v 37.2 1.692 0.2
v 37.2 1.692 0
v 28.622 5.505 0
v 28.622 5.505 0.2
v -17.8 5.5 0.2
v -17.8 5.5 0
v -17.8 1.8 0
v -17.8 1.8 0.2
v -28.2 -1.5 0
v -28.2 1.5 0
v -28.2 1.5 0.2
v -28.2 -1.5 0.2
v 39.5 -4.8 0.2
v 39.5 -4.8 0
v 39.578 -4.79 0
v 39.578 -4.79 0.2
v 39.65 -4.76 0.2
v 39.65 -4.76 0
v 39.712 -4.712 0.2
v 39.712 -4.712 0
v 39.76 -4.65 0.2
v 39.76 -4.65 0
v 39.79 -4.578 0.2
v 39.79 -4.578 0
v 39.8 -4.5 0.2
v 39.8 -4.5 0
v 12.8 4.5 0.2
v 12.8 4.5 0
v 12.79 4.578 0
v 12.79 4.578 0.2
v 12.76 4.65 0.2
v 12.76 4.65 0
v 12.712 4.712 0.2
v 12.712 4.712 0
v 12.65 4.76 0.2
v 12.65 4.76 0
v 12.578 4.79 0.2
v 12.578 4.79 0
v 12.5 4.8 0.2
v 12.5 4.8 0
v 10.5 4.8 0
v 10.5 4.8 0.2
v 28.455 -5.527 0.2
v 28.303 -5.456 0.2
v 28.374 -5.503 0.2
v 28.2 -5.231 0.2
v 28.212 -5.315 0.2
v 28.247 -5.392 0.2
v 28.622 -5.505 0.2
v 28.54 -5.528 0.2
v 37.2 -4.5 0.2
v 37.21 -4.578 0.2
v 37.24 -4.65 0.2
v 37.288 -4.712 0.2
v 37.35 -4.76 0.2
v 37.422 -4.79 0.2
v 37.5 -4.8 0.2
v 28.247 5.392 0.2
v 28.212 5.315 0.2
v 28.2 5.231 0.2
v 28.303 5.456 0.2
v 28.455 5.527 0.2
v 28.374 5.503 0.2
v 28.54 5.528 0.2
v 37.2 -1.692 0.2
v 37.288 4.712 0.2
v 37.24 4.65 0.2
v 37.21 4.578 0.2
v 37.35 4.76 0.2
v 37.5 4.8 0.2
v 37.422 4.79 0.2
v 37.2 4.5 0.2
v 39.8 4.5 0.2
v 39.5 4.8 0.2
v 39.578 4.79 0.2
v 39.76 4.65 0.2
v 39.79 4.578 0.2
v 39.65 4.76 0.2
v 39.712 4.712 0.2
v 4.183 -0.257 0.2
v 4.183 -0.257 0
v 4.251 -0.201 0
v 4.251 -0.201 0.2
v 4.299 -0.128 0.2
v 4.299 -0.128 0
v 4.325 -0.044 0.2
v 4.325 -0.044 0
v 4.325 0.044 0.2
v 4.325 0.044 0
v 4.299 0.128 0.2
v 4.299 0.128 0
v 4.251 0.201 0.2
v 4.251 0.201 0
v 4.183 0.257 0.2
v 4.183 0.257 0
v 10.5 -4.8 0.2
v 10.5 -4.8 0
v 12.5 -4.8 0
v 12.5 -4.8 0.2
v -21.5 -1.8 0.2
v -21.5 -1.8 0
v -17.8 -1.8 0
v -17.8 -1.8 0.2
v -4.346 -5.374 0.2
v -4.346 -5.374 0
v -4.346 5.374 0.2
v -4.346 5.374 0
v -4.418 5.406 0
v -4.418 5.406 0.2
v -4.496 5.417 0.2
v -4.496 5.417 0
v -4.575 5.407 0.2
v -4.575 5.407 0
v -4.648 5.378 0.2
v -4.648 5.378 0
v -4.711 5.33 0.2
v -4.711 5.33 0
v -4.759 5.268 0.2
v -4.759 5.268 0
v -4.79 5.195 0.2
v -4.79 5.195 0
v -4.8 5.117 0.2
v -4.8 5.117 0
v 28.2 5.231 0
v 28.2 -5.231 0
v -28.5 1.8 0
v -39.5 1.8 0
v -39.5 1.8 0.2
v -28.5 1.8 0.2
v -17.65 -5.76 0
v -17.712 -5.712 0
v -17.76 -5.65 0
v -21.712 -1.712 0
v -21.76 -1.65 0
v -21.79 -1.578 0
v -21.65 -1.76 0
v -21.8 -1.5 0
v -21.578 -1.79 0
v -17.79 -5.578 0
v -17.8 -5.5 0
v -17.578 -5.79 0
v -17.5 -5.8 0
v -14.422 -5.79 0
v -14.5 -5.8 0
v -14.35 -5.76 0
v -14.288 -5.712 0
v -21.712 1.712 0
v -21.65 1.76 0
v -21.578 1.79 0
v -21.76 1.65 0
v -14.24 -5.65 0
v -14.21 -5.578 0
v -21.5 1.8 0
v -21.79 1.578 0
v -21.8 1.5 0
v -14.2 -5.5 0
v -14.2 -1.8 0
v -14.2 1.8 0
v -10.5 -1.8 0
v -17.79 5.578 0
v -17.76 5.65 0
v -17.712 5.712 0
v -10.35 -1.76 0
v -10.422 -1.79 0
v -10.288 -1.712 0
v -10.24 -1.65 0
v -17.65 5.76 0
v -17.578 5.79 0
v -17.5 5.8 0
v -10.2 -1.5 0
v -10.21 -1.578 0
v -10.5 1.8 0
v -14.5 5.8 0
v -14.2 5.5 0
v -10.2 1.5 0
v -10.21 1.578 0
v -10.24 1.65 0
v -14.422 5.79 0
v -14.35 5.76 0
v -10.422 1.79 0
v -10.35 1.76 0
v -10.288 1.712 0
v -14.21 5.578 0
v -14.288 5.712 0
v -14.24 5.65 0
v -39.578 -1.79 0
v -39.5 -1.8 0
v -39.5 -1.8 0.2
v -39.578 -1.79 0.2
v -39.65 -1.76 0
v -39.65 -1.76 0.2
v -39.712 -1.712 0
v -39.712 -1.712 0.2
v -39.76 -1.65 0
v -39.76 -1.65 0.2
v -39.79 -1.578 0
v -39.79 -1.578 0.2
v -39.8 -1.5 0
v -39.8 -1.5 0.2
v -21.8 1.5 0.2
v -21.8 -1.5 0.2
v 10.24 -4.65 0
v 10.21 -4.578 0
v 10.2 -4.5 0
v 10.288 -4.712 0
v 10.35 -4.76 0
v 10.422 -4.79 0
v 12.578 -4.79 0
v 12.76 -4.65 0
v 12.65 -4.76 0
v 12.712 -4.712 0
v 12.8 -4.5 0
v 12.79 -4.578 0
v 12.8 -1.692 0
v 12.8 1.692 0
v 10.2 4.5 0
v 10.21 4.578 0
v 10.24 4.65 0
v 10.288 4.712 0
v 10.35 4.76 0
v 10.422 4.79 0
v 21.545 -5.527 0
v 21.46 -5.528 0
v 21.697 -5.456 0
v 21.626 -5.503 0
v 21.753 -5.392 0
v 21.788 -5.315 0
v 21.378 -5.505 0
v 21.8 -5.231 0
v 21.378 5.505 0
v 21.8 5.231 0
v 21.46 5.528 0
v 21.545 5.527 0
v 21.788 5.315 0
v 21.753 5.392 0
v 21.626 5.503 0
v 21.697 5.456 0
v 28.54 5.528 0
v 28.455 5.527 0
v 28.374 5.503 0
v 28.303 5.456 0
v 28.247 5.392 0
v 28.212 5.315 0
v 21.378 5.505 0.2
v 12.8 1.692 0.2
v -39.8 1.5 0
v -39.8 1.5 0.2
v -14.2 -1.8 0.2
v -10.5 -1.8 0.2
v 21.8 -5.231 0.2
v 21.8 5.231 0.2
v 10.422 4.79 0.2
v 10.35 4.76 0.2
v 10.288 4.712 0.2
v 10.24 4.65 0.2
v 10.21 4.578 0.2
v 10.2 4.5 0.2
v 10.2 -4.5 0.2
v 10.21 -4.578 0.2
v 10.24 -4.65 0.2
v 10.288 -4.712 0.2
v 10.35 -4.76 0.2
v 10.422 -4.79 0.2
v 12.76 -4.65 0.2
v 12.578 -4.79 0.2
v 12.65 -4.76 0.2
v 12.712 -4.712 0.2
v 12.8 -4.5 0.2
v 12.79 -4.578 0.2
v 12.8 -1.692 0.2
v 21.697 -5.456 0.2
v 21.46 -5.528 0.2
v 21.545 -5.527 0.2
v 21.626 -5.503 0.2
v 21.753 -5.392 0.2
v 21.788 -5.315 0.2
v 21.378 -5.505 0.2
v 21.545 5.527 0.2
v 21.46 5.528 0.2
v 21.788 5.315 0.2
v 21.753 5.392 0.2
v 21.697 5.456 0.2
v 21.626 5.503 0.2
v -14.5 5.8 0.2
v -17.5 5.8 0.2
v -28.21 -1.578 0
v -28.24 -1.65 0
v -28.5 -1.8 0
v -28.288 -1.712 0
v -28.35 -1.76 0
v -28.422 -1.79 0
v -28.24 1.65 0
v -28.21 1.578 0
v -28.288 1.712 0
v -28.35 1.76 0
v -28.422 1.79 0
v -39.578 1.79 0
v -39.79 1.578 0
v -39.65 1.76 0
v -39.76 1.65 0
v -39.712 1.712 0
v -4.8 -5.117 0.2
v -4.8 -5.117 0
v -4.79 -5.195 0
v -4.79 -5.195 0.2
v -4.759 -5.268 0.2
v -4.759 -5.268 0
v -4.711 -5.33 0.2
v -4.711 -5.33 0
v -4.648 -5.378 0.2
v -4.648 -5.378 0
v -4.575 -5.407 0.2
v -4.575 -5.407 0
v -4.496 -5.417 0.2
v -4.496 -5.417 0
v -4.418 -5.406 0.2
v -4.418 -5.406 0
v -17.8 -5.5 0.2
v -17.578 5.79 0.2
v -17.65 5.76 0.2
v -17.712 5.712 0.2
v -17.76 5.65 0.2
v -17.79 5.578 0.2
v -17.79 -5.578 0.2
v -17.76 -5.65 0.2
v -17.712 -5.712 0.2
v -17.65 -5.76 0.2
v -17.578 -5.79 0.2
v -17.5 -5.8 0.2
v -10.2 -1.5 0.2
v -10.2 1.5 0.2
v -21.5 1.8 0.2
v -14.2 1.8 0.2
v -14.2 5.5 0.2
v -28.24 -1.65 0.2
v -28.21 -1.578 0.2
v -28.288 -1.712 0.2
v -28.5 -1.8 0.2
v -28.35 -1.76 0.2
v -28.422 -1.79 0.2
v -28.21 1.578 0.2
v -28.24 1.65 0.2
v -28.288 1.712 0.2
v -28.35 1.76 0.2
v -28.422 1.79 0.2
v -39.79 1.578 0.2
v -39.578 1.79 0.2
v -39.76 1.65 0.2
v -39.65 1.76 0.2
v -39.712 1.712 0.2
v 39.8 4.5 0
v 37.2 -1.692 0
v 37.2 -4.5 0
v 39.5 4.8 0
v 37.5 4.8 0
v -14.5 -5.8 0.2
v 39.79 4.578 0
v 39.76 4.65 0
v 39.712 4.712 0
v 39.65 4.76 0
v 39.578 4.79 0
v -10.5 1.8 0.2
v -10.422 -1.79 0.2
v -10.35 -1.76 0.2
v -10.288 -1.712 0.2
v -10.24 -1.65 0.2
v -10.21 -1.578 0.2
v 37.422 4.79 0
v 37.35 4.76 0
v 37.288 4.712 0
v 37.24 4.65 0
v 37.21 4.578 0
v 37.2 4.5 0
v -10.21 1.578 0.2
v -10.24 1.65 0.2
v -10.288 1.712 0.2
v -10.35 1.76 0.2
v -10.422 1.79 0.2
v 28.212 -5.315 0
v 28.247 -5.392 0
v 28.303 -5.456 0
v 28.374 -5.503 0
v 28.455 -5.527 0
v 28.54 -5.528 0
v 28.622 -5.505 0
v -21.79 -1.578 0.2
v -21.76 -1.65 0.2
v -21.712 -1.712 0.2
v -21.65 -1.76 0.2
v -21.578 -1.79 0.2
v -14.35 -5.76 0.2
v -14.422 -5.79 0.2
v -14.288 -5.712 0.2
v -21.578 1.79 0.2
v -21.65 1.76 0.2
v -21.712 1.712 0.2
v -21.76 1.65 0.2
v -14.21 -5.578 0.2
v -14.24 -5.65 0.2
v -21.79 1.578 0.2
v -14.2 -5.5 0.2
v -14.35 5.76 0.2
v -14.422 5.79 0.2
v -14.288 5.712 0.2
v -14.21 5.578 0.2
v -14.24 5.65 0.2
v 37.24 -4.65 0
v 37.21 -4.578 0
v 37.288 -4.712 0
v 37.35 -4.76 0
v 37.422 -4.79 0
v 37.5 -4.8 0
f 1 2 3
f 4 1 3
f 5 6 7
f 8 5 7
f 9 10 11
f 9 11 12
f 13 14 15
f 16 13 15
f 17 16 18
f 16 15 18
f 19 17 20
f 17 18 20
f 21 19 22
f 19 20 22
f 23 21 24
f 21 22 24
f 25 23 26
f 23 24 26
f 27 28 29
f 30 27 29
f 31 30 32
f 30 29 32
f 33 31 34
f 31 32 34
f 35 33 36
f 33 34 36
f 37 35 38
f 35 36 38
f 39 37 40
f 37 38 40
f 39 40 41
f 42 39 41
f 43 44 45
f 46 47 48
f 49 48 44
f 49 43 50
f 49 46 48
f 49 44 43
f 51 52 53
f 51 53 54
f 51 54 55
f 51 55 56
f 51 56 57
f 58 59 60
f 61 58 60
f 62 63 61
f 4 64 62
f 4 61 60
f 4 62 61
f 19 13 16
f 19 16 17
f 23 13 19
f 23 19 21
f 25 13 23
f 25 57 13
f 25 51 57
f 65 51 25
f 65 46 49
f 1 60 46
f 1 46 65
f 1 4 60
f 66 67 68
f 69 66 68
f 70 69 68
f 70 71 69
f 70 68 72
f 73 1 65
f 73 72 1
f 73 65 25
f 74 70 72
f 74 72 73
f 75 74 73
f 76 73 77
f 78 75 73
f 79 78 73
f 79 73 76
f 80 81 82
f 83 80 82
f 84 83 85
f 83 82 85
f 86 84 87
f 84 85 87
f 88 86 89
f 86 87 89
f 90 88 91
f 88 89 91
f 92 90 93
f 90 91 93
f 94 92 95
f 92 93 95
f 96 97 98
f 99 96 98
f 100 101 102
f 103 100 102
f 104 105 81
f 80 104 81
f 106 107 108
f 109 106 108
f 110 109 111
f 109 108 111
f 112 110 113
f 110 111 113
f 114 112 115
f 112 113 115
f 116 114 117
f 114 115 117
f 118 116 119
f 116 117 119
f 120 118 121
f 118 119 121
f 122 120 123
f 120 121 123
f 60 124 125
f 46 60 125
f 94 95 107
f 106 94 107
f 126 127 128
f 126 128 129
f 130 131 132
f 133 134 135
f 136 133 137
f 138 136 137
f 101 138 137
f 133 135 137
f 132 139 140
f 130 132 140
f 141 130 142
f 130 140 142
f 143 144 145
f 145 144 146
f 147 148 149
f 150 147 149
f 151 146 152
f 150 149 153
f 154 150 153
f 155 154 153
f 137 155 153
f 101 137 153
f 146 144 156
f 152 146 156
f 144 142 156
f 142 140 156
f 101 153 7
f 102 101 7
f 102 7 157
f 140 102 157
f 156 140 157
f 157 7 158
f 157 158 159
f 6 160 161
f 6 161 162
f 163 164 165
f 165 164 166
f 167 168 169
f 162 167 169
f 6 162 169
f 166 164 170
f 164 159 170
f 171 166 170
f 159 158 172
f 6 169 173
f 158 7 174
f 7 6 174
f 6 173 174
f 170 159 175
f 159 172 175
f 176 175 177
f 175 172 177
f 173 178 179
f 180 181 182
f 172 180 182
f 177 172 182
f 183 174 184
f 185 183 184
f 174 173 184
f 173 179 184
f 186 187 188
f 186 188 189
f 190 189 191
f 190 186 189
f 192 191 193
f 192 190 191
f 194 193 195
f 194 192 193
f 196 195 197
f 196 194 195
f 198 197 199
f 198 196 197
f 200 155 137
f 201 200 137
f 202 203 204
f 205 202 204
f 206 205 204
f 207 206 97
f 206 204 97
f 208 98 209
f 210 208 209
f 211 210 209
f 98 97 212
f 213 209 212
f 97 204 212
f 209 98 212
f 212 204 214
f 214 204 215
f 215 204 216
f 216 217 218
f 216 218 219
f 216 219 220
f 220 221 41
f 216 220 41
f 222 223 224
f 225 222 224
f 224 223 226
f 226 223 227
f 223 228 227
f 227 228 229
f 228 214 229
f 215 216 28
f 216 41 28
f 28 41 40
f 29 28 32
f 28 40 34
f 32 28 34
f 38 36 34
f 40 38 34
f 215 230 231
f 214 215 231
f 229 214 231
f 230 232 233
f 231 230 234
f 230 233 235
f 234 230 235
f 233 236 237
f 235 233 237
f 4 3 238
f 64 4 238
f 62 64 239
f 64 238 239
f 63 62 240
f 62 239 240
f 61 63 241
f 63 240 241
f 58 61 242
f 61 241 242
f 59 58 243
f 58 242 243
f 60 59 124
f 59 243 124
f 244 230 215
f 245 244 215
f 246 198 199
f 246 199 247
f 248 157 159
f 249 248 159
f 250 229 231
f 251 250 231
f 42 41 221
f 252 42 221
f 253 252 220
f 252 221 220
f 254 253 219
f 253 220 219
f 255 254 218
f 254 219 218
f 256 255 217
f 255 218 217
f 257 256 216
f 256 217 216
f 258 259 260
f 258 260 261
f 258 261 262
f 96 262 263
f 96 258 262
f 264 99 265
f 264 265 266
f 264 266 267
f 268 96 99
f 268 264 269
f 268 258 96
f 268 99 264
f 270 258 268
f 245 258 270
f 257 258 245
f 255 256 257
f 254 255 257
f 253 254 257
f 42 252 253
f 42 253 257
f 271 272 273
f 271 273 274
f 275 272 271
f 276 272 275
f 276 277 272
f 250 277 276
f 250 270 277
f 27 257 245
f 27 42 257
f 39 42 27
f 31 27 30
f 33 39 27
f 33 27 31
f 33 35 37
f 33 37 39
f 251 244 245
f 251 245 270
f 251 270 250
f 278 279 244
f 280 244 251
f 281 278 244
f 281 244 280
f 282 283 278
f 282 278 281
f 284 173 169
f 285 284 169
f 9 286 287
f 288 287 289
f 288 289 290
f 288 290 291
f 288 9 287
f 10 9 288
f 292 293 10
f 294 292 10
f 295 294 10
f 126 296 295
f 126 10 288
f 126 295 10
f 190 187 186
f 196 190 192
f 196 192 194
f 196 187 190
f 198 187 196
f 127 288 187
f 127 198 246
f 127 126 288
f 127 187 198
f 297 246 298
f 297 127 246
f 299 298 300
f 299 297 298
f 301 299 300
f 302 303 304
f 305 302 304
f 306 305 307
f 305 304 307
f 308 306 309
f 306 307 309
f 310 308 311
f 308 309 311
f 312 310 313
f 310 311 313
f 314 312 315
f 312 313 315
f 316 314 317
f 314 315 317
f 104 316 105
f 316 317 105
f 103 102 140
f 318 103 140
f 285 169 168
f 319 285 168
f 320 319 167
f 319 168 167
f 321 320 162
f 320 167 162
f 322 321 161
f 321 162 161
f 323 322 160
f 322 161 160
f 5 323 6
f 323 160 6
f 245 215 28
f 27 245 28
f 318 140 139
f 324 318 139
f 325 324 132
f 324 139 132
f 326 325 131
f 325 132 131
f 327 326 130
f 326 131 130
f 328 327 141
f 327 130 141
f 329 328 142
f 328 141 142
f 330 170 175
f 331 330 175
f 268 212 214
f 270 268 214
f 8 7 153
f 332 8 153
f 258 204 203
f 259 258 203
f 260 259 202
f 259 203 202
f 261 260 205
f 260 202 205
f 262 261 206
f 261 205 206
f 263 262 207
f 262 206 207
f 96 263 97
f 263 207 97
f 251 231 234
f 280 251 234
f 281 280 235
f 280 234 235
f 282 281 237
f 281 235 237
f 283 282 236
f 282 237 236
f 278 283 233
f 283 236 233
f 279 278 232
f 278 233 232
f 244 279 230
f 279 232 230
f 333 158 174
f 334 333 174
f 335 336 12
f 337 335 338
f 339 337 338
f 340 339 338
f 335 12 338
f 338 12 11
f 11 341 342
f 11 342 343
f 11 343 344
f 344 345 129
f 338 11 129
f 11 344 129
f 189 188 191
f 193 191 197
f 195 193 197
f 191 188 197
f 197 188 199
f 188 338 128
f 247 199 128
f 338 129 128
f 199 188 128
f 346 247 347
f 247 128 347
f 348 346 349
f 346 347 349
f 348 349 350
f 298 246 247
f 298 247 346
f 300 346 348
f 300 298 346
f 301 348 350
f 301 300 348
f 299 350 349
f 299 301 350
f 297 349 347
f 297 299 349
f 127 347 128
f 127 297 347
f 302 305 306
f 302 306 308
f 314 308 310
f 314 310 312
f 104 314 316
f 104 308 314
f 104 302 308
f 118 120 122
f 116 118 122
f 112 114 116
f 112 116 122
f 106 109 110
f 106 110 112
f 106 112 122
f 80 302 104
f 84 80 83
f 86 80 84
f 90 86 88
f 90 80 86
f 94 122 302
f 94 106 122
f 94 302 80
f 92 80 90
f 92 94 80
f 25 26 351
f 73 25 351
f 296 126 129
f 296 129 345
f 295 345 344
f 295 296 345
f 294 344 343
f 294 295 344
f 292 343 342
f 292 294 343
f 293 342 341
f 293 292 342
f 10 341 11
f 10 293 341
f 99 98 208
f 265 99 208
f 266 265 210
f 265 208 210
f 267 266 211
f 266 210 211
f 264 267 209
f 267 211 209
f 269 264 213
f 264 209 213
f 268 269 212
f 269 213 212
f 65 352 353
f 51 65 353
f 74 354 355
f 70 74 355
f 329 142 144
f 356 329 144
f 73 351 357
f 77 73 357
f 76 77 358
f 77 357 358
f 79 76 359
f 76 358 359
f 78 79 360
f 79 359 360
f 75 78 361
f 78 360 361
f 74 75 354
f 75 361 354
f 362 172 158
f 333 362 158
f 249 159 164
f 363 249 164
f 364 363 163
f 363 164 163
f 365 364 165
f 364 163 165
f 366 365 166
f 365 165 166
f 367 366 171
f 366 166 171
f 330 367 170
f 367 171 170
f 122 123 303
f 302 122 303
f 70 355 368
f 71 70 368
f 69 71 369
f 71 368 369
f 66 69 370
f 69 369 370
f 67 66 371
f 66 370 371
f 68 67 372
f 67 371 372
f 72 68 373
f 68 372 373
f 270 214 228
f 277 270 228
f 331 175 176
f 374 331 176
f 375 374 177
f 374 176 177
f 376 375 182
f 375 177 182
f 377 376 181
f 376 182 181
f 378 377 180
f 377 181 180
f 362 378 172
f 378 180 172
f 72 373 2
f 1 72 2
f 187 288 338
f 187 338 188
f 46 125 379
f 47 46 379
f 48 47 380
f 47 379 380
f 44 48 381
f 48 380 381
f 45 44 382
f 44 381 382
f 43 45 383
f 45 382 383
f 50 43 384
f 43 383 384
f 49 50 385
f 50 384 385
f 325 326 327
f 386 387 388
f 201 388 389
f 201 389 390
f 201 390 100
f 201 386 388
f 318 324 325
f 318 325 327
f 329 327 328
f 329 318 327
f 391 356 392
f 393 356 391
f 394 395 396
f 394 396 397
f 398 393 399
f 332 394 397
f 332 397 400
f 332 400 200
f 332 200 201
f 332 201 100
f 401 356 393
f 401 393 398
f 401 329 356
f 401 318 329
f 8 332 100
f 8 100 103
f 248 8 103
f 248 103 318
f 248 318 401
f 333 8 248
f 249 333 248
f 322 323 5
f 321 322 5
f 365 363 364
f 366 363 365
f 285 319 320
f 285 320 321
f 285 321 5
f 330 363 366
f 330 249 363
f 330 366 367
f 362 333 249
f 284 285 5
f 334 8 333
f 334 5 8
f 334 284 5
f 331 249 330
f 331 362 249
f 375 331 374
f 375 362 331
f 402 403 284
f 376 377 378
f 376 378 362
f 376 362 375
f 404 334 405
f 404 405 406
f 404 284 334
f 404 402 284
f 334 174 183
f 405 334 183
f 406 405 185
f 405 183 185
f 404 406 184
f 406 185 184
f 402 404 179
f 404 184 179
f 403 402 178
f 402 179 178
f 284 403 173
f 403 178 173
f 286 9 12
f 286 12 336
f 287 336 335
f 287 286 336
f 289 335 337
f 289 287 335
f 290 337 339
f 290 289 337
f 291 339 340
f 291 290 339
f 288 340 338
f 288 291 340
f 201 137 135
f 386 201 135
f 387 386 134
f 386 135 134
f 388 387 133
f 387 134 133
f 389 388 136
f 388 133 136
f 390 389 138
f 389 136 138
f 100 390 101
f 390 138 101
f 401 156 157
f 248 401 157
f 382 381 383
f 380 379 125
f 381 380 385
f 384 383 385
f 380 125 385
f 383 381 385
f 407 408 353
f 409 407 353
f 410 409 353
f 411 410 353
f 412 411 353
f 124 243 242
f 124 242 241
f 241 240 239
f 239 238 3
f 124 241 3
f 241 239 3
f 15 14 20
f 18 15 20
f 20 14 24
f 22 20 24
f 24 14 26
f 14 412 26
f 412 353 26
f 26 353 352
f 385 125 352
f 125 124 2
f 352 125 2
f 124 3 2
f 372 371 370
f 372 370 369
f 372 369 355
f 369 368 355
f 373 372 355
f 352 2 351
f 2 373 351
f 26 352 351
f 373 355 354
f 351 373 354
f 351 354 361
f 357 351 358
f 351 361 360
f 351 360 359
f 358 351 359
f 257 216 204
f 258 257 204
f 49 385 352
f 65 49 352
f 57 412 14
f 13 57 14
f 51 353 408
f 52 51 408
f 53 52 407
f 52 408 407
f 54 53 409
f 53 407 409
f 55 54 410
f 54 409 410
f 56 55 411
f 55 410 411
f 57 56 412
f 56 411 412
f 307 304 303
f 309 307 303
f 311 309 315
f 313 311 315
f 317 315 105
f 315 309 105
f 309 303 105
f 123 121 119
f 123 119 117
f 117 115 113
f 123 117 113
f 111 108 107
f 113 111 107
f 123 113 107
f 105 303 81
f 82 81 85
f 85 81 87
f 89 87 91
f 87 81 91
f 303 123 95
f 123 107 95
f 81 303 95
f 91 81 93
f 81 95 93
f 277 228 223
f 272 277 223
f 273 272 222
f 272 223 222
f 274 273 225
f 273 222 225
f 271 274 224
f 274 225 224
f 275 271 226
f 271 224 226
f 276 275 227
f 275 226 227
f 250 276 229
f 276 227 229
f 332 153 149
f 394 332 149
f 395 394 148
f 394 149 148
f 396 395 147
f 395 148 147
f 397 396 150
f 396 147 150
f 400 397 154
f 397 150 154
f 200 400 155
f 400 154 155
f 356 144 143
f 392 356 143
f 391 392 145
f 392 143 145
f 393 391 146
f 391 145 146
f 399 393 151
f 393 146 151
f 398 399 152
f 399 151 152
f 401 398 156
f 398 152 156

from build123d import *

# Parameters (mm, degrees)
BOSS_EXTRUDE1_DEPTH   = 0.2
BOSS_EXTRUDE1_2_DEPTH = 0.2
BOSS_EXTRUDE1_3_DEPTH = 0.2
BOSS_EXTRUDE1_4_DEPTH = 0.2
BOSS_EXTRUDE1_5_DEPTH = 0.2


with BuildPart() as part:
    # Sketch2 → Boss-Extrude1 (new body)
    with BuildSketch(Plane.XY):
        with BuildLine():
            Line((-4.8, 5.116904811), (-4.8, -5.116904811))
            ThreePointArc((-4.8, -5.116904811), (-4.647809644, -5.377964783), (-4.345651273, -5.374152688))
            Line((-4.345651273, -5.374152688), (4.182523411, -0.257247878))
            ThreePointArc((4.182523411, -0.257247878), (4.328174684, 0), (4.182523411, 0.257247878))
            Line((4.182523411, 0.257247878), (-4.345651273, 5.374152688))
            ThreePointArc((-4.345651273, 5.374152688), (-4.647809644, 5.377964783), (-4.8, 5.116904811))
        make_face()
    extrude(amount=BOSS_EXTRUDE1_DEPTH)


with BuildPart() as body_2:
    # Sketch2 → Boss-Extrude1 2 (new body)
    with BuildSketch(Plane.XY):
        with BuildLine():
            Line((-10.2, -1.5), (-10.2, 1.5))
            ThreePointArc((-10.2, 1.5), (-10.287867966, 1.712132034), (-10.5, 1.8))
            Line((-10.5, 1.8), (-14.2, 1.8))
            Line((-14.2, 1.8), (-14.2, 5.5))
            ThreePointArc((-14.2, 5.5), (-14.287867966, 5.712132034), (-14.5, 5.8))
            Line((-14.5, 5.8), (-17.5, 5.8))
            ThreePointArc((-17.5, 5.8), (-17.712132034, 5.712132034), (-17.8, 5.5))
            Line((-17.8, 5.5), (-17.8, 1.8))
            Line((-17.8, 1.8), (-21.5, 1.8))
            ThreePointArc((-21.5, 1.8), (-21.712132034, 1.712132034), (-21.8, 1.5))
            Line((-21.8, 1.5), (-21.8, -1.5))
            ThreePointArc((-21.8, -1.5), (-21.712132034, -1.712132034), (-21.5, -1.8))
            Line((-21.5, -1.8), (-17.8, -1.8))
            Line((-17.8, -1.8), (-17.8, -5.5))
            ThreePointArc((-17.8, -5.5), (-17.712132034, -5.712132034), (-17.5, -5.8))
            Line((-17.5, -5.8), (-14.5, -5.8))
            ThreePointArc((-14.5, -5.8), (-14.287867966, -5.712132034), (-14.2, -5.5))
            Line((-14.2, -5.5), (-14.2, -1.8))
            Line((-14.2, -1.8), (-10.5, -1.8))
            ThreePointArc((-10.5, -1.8), (-10.287867966, -1.712132034), (-10.2, -1.5))
        make_face()
    extrude(amount=BOSS_EXTRUDE1_2_DEPTH)


with BuildPart() as body_3:
    # Sketch2 → Boss-Extrude1 3 (new body)
    with BuildSketch(Plane.XY):
        with BuildLine():
            Line((-28.2, 1.5), (-28.2, -1.5))
            ThreePointArc((-28.2, -1.5), (-28.287867966, -1.712132034), (-28.5, -1.8))
            Line((-28.5, -1.8), (-39.5, -1.8))
            ThreePointArc((-39.5, -1.8), (-39.712132034, -1.712132034), (-39.8, -1.5))
            Line((-39.8, -1.5), (-39.8, 1.5))
            ThreePointArc((-39.8, 1.5), (-39.712132034, 1.712132034), (-39.5, 1.8))
            Line((-39.5, 1.8), (-28.5, 1.8))
            ThreePointArc((-28.5, 1.8), (-28.287867966, 1.712132034), (-28.2, 1.5))
        make_face()
    extrude(amount=BOSS_EXTRUDE1_3_DEPTH)


with BuildPart() as body_4:
    # Sketch2 → Boss-Extrude1 4 (new body)
    with BuildSketch(Plane.XY):
        with BuildLine():
            Line((10.2, 4.5), (10.2, -4.5))
            ThreePointArc((10.2, -4.5), (10.287867966, -4.712132034), (10.5, -4.8))
            Line((10.5, -4.8), (12.5, -4.8))
            ThreePointArc((12.5, -4.8), (12.712132034, -4.712132034), (12.8, -4.5))
            Line((12.8, -4.5), (12.8, -1.692247604))
            Line((12.8, -1.692247604), (21.37815846, -5.504762476))
            ThreePointArc((21.37815846, -5.504762476), (21.663474062, -5.482166682), (21.8, -5.230619011))
            Line((21.8, -5.230619011), (21.8, 5.230619011))
            ThreePointArc((21.8, 5.230619011), (21.663474062, 5.482166682), (21.37815846, 5.504762476))
            Line((21.37815846, 5.504762476), (12.8, 1.692247604))
            Line((12.8, 1.692247604), (12.8, 4.5))
            ThreePointArc((12.8, 4.5), (12.712132034, 4.712132034), (12.5, 4.8))
            Line((12.5, 4.8), (10.5, 4.8))
            ThreePointArc((10.5, 4.8), (10.287867966, 4.712132034), (10.2, 4.5))
        make_face()
    extrude(amount=BOSS_EXTRUDE1_4_DEPTH)


with BuildPart() as body_5:
    # Sketch2 → Boss-Extrude1 5 (new body)
    with BuildSketch(Plane.XY):
        with BuildLine():
            Line((28.2, 5.230619011), (28.2, -5.230619011))
            ThreePointArc((28.2, -5.230619011), (28.336525938, -5.482166682), (28.62184154, -5.504762476))
            Line((28.62184154, -5.504762476), (37.2, -1.692247604))
            Line((37.2, -1.692247604), (37.2, -4.5))
            ThreePointArc((37.2, -4.5), (37.287867966, -4.712132034), (37.5, -4.8))
            Line((37.5, -4.8), (39.5, -4.8))
            ThreePointArc((39.5, -4.8), (39.712132034, -4.712132034), (39.8, -4.5))
            Line((39.8, -4.5), (39.8, 4.5))
            ThreePointArc((39.8, 4.5), (39.712132034, 4.712132034), (39.5, 4.8))
            Line((39.5, 4.8), (37.5, 4.8))
            ThreePointArc((37.5, 4.8), (37.287867966, 4.712132034), (37.2, 4.5))
            Line((37.2, 4.5), (37.2, 1.692247604))
            Line((37.2, 1.692247604), (28.62184154, 5.504762476))
            ThreePointArc((28.62184154, 5.504762476), (28.336525938, 5.482166682), (28.2, 5.230619011))
        make_face()
    extrude(amount=BOSS_EXTRUDE1_5_DEPTH)


solid = Compound([part.part, body_2.part, body_3.part, body_4.part, body_5.part])
